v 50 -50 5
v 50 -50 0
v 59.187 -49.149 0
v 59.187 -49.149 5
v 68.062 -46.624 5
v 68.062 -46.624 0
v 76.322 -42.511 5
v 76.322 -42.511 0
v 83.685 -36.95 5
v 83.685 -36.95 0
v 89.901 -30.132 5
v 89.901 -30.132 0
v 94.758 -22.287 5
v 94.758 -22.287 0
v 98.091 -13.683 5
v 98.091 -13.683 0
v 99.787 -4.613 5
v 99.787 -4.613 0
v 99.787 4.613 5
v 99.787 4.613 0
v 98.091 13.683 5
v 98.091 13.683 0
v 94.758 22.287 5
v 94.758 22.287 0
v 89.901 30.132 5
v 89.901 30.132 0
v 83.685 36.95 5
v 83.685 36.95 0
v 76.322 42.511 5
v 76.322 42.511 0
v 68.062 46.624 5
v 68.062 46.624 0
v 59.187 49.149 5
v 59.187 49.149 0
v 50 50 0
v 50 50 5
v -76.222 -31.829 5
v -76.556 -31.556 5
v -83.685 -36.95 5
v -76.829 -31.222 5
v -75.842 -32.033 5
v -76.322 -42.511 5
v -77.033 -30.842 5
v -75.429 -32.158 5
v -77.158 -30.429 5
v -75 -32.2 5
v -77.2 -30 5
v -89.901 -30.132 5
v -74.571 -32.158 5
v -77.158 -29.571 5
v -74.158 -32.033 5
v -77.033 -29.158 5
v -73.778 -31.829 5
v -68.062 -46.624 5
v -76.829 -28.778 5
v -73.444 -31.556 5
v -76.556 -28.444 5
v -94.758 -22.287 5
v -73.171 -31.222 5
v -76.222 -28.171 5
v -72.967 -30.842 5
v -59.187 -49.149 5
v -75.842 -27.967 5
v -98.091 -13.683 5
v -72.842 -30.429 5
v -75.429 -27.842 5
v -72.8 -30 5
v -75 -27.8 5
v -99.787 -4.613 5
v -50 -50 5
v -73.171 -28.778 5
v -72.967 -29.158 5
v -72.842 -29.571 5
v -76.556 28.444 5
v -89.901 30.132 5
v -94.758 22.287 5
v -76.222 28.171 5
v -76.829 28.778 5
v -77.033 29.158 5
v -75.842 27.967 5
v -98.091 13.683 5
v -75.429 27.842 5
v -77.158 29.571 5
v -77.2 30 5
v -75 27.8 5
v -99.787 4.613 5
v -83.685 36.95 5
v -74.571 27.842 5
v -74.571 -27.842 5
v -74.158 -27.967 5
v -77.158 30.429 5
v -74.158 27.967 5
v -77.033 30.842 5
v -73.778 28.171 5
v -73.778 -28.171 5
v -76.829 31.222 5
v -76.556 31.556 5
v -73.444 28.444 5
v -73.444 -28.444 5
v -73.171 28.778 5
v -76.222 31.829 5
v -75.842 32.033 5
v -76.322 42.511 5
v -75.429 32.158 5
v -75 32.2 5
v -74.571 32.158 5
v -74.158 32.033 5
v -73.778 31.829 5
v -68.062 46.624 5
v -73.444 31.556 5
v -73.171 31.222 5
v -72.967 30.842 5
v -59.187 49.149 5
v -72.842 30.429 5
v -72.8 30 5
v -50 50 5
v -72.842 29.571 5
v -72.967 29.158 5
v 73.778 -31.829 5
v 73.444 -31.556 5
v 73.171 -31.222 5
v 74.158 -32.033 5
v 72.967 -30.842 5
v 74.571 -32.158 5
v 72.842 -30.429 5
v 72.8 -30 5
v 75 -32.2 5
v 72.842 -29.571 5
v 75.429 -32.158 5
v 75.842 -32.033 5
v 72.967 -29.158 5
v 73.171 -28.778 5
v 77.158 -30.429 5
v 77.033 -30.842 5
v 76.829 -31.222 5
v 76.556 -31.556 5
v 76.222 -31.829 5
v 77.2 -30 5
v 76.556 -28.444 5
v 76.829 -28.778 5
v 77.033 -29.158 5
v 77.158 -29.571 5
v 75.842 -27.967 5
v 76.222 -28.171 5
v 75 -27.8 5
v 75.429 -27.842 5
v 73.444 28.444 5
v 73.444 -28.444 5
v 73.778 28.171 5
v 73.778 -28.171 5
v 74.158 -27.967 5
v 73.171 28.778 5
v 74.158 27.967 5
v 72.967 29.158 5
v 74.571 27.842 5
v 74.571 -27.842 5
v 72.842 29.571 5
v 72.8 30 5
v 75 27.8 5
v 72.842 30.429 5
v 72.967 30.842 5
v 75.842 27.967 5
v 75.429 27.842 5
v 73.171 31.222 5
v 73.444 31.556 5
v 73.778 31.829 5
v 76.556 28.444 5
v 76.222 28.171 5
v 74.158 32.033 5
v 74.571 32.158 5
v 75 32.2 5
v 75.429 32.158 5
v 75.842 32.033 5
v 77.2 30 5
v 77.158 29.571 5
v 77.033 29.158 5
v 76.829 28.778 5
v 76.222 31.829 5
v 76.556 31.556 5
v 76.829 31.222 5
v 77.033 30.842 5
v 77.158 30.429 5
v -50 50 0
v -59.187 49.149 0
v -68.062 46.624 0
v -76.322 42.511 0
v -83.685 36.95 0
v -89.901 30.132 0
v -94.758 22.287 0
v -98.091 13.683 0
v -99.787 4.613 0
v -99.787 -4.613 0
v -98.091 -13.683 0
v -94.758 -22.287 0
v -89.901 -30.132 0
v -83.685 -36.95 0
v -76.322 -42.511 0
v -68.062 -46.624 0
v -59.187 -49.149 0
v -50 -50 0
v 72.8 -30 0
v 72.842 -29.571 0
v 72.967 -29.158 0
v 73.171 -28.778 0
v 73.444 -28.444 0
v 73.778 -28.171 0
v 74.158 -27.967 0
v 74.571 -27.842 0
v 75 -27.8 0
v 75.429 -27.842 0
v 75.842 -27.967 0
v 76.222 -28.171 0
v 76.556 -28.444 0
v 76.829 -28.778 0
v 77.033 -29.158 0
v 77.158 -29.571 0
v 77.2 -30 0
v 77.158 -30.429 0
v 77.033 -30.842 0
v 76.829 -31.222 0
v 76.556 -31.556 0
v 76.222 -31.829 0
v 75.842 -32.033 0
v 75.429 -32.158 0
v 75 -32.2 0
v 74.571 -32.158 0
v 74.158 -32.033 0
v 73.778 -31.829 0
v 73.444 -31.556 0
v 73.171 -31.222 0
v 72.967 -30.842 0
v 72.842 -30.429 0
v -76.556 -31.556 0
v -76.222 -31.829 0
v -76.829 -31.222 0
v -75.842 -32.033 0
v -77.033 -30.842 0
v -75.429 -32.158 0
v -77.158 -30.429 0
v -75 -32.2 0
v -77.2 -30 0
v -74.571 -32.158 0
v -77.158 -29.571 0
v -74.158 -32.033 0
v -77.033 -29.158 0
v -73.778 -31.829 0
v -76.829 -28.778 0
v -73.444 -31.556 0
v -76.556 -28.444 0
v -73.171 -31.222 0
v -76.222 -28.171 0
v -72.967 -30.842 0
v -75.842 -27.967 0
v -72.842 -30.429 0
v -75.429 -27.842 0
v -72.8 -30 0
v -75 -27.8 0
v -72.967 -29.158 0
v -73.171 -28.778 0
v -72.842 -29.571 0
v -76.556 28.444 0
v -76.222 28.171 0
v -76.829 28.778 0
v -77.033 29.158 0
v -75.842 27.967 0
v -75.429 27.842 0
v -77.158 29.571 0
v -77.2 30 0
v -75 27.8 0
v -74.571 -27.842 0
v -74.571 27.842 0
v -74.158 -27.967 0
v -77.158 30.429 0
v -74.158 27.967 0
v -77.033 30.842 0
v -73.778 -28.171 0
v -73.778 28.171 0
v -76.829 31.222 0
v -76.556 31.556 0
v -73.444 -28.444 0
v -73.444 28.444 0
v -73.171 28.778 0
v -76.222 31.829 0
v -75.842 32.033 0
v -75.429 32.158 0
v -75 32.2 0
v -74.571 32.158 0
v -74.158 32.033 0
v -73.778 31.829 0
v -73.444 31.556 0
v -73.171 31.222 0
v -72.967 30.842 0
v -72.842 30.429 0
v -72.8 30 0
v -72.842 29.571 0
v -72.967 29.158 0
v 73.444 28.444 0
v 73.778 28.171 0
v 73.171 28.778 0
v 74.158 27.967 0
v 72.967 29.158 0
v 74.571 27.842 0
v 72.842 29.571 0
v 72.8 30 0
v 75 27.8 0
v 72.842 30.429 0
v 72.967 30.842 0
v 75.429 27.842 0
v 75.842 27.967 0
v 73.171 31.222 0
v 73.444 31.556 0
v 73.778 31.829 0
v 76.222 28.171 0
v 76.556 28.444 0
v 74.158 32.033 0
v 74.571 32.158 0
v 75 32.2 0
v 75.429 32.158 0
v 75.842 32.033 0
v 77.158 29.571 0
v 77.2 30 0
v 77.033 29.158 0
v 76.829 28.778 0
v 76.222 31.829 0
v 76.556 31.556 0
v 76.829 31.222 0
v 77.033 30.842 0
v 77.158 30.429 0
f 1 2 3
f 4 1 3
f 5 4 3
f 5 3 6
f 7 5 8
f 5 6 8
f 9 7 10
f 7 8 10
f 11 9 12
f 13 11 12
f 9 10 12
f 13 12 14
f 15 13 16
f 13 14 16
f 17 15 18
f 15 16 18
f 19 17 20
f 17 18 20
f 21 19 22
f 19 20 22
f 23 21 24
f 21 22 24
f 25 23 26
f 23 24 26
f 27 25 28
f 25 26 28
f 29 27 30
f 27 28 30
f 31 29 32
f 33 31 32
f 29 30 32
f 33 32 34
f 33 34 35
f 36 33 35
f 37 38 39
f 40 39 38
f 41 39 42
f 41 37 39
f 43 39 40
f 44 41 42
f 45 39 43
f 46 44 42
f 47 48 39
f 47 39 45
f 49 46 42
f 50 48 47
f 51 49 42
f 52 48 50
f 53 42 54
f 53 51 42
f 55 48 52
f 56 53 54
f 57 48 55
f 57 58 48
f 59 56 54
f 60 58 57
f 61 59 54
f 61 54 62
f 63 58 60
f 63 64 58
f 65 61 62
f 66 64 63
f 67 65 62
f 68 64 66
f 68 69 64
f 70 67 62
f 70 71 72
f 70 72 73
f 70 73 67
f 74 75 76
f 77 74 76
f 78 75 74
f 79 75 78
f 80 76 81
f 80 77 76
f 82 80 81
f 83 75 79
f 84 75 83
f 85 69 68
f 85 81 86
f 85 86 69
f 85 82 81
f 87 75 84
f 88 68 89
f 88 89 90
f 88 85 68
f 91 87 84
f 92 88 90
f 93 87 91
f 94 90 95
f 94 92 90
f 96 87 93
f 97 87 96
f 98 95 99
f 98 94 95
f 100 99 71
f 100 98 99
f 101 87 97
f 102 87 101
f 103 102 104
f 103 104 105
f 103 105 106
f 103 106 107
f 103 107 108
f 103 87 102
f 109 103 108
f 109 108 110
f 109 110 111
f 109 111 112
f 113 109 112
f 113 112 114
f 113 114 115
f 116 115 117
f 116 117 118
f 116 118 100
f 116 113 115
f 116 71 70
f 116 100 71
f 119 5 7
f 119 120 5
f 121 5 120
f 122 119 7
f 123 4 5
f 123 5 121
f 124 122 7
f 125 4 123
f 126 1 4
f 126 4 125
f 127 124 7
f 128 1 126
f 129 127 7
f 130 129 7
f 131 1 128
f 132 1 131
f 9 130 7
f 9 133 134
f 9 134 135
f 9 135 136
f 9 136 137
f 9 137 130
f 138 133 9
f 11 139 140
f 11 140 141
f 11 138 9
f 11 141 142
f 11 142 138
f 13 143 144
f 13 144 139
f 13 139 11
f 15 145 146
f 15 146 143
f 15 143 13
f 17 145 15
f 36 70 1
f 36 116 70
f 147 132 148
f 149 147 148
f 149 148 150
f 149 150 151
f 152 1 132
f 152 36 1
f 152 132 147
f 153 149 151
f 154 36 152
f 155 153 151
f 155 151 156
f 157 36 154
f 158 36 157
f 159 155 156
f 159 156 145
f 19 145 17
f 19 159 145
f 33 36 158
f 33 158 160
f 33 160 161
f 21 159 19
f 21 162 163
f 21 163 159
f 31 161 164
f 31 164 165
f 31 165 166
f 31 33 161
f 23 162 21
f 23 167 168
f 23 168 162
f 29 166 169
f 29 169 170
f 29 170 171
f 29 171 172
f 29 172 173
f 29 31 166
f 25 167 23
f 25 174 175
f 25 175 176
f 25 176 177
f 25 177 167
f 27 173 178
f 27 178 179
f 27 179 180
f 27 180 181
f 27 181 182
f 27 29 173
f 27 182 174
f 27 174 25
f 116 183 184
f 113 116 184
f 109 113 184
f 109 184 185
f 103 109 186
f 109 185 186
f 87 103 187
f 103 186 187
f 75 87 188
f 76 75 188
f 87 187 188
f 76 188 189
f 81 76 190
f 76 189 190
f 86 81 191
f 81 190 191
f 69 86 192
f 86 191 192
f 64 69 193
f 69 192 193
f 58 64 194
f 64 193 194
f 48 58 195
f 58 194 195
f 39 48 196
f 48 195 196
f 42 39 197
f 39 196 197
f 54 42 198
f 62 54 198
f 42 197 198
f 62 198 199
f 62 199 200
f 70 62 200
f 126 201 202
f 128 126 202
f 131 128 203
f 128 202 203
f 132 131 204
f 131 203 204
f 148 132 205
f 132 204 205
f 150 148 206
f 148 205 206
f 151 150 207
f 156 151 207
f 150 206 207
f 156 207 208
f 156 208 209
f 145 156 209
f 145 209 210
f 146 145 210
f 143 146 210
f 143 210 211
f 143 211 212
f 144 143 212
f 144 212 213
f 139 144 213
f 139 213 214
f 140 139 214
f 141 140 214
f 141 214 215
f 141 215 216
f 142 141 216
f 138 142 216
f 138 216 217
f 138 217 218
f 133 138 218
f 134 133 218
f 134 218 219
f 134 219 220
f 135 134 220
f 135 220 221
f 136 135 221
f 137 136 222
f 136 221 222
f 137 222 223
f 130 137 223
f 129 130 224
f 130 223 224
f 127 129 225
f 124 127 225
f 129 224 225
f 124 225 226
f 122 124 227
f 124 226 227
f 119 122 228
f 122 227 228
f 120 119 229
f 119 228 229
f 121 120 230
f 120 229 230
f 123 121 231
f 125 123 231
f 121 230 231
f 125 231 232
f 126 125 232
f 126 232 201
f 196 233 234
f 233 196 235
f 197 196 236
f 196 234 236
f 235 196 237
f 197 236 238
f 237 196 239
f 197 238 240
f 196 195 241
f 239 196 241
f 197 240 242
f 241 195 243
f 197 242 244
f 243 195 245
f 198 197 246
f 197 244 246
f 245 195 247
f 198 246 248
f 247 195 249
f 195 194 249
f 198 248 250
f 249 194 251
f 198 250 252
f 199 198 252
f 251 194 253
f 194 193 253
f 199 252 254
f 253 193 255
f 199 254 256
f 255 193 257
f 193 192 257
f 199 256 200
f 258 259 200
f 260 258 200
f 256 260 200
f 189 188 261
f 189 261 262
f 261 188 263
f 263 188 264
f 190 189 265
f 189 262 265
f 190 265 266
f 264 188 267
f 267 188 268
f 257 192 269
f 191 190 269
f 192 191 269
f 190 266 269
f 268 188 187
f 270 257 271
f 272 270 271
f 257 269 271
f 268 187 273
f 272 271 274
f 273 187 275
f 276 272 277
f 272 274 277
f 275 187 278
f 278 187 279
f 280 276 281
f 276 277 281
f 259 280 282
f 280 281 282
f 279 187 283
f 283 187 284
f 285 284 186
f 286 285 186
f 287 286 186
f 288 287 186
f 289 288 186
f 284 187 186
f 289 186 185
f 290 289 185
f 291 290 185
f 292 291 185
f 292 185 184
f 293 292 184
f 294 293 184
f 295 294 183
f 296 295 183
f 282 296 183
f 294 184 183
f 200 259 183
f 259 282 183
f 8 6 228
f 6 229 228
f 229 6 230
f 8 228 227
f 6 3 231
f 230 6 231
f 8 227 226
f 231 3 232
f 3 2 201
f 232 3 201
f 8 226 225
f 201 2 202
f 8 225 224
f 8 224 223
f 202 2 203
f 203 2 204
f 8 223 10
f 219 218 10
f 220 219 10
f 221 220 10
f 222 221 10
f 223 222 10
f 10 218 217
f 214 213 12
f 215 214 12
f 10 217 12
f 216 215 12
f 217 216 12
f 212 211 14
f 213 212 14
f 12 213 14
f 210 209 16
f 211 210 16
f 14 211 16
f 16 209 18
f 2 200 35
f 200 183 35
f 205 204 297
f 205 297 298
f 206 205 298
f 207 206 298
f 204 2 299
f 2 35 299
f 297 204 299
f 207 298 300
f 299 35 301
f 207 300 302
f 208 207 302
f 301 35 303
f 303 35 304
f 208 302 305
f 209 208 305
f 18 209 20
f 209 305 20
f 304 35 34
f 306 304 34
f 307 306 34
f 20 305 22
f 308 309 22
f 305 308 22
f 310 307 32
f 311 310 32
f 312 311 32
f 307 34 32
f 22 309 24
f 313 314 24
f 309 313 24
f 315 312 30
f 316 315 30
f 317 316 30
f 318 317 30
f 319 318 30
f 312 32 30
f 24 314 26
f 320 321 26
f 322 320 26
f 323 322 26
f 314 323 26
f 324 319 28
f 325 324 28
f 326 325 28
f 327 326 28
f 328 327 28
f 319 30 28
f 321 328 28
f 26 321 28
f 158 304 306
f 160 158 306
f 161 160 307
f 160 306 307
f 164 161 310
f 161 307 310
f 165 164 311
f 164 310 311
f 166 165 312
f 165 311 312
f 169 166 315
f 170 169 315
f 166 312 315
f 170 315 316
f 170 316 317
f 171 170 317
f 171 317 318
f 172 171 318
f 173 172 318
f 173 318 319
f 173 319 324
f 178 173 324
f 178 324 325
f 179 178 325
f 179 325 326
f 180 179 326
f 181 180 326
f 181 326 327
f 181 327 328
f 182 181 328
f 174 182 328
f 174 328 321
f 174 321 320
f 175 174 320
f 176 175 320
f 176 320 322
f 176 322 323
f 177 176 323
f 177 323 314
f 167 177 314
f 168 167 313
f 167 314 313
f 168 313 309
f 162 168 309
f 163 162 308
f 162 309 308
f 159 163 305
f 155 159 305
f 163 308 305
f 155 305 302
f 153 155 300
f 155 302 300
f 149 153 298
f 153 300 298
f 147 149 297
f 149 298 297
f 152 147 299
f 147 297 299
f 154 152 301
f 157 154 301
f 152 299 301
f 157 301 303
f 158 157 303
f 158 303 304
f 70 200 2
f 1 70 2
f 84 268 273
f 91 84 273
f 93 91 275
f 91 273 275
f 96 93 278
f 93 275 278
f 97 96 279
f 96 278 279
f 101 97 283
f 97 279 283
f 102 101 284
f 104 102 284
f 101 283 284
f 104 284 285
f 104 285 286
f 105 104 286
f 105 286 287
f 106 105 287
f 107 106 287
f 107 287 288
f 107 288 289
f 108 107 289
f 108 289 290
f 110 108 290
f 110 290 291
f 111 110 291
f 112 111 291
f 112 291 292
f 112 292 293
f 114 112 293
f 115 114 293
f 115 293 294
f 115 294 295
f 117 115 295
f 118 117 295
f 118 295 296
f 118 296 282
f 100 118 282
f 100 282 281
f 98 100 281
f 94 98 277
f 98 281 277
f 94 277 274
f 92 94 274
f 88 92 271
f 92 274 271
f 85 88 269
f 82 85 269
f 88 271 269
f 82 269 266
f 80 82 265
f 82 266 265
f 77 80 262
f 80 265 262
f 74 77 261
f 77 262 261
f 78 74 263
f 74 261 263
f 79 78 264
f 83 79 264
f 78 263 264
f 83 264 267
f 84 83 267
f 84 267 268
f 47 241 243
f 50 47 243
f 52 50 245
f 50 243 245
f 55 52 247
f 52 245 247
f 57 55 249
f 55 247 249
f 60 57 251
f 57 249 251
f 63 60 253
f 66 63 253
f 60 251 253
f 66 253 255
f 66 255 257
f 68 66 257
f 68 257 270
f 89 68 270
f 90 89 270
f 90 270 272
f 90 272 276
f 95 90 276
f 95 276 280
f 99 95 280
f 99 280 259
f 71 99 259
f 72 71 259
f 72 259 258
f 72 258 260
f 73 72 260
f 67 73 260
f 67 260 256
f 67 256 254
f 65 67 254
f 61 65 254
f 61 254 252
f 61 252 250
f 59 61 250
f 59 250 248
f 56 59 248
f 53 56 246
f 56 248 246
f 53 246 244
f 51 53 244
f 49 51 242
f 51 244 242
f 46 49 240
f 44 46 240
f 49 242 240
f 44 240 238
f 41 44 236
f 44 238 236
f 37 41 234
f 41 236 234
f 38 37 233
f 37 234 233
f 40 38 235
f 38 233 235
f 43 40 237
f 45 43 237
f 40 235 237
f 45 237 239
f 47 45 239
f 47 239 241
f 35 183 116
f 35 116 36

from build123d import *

# Parameters (mm, degrees)
F0_W     = 100
F0_H     = 100
F1_DEPTH = 5
F3_D     = 4.4


with BuildPart() as f1:
    # F0 (on Top) → F1 (new body)
    with BuildSketch(Plane.XY):
        Rectangle(F0_W, F0_H)
        with BuildLine():
            ThreePointArc((50, -50), (100, 0), (50, 50))
            Line((50, 50), (50, -50))
        make_face()
        with BuildLine():
            Line((-50, -50), (-50, 50))
            ThreePointArc((-50, 50), (-100, 0), (-50, -50))
        make_face()
    extrude(amount=F1_DEPTH)

    # F3 (through all)
    with Locations(Plane.XY.offset(5)):
        with Locations((-75, 30), (75, 30), (75, -30), (-75, -30)):
            Hole(F3_D / 2)


solid = f1.part
